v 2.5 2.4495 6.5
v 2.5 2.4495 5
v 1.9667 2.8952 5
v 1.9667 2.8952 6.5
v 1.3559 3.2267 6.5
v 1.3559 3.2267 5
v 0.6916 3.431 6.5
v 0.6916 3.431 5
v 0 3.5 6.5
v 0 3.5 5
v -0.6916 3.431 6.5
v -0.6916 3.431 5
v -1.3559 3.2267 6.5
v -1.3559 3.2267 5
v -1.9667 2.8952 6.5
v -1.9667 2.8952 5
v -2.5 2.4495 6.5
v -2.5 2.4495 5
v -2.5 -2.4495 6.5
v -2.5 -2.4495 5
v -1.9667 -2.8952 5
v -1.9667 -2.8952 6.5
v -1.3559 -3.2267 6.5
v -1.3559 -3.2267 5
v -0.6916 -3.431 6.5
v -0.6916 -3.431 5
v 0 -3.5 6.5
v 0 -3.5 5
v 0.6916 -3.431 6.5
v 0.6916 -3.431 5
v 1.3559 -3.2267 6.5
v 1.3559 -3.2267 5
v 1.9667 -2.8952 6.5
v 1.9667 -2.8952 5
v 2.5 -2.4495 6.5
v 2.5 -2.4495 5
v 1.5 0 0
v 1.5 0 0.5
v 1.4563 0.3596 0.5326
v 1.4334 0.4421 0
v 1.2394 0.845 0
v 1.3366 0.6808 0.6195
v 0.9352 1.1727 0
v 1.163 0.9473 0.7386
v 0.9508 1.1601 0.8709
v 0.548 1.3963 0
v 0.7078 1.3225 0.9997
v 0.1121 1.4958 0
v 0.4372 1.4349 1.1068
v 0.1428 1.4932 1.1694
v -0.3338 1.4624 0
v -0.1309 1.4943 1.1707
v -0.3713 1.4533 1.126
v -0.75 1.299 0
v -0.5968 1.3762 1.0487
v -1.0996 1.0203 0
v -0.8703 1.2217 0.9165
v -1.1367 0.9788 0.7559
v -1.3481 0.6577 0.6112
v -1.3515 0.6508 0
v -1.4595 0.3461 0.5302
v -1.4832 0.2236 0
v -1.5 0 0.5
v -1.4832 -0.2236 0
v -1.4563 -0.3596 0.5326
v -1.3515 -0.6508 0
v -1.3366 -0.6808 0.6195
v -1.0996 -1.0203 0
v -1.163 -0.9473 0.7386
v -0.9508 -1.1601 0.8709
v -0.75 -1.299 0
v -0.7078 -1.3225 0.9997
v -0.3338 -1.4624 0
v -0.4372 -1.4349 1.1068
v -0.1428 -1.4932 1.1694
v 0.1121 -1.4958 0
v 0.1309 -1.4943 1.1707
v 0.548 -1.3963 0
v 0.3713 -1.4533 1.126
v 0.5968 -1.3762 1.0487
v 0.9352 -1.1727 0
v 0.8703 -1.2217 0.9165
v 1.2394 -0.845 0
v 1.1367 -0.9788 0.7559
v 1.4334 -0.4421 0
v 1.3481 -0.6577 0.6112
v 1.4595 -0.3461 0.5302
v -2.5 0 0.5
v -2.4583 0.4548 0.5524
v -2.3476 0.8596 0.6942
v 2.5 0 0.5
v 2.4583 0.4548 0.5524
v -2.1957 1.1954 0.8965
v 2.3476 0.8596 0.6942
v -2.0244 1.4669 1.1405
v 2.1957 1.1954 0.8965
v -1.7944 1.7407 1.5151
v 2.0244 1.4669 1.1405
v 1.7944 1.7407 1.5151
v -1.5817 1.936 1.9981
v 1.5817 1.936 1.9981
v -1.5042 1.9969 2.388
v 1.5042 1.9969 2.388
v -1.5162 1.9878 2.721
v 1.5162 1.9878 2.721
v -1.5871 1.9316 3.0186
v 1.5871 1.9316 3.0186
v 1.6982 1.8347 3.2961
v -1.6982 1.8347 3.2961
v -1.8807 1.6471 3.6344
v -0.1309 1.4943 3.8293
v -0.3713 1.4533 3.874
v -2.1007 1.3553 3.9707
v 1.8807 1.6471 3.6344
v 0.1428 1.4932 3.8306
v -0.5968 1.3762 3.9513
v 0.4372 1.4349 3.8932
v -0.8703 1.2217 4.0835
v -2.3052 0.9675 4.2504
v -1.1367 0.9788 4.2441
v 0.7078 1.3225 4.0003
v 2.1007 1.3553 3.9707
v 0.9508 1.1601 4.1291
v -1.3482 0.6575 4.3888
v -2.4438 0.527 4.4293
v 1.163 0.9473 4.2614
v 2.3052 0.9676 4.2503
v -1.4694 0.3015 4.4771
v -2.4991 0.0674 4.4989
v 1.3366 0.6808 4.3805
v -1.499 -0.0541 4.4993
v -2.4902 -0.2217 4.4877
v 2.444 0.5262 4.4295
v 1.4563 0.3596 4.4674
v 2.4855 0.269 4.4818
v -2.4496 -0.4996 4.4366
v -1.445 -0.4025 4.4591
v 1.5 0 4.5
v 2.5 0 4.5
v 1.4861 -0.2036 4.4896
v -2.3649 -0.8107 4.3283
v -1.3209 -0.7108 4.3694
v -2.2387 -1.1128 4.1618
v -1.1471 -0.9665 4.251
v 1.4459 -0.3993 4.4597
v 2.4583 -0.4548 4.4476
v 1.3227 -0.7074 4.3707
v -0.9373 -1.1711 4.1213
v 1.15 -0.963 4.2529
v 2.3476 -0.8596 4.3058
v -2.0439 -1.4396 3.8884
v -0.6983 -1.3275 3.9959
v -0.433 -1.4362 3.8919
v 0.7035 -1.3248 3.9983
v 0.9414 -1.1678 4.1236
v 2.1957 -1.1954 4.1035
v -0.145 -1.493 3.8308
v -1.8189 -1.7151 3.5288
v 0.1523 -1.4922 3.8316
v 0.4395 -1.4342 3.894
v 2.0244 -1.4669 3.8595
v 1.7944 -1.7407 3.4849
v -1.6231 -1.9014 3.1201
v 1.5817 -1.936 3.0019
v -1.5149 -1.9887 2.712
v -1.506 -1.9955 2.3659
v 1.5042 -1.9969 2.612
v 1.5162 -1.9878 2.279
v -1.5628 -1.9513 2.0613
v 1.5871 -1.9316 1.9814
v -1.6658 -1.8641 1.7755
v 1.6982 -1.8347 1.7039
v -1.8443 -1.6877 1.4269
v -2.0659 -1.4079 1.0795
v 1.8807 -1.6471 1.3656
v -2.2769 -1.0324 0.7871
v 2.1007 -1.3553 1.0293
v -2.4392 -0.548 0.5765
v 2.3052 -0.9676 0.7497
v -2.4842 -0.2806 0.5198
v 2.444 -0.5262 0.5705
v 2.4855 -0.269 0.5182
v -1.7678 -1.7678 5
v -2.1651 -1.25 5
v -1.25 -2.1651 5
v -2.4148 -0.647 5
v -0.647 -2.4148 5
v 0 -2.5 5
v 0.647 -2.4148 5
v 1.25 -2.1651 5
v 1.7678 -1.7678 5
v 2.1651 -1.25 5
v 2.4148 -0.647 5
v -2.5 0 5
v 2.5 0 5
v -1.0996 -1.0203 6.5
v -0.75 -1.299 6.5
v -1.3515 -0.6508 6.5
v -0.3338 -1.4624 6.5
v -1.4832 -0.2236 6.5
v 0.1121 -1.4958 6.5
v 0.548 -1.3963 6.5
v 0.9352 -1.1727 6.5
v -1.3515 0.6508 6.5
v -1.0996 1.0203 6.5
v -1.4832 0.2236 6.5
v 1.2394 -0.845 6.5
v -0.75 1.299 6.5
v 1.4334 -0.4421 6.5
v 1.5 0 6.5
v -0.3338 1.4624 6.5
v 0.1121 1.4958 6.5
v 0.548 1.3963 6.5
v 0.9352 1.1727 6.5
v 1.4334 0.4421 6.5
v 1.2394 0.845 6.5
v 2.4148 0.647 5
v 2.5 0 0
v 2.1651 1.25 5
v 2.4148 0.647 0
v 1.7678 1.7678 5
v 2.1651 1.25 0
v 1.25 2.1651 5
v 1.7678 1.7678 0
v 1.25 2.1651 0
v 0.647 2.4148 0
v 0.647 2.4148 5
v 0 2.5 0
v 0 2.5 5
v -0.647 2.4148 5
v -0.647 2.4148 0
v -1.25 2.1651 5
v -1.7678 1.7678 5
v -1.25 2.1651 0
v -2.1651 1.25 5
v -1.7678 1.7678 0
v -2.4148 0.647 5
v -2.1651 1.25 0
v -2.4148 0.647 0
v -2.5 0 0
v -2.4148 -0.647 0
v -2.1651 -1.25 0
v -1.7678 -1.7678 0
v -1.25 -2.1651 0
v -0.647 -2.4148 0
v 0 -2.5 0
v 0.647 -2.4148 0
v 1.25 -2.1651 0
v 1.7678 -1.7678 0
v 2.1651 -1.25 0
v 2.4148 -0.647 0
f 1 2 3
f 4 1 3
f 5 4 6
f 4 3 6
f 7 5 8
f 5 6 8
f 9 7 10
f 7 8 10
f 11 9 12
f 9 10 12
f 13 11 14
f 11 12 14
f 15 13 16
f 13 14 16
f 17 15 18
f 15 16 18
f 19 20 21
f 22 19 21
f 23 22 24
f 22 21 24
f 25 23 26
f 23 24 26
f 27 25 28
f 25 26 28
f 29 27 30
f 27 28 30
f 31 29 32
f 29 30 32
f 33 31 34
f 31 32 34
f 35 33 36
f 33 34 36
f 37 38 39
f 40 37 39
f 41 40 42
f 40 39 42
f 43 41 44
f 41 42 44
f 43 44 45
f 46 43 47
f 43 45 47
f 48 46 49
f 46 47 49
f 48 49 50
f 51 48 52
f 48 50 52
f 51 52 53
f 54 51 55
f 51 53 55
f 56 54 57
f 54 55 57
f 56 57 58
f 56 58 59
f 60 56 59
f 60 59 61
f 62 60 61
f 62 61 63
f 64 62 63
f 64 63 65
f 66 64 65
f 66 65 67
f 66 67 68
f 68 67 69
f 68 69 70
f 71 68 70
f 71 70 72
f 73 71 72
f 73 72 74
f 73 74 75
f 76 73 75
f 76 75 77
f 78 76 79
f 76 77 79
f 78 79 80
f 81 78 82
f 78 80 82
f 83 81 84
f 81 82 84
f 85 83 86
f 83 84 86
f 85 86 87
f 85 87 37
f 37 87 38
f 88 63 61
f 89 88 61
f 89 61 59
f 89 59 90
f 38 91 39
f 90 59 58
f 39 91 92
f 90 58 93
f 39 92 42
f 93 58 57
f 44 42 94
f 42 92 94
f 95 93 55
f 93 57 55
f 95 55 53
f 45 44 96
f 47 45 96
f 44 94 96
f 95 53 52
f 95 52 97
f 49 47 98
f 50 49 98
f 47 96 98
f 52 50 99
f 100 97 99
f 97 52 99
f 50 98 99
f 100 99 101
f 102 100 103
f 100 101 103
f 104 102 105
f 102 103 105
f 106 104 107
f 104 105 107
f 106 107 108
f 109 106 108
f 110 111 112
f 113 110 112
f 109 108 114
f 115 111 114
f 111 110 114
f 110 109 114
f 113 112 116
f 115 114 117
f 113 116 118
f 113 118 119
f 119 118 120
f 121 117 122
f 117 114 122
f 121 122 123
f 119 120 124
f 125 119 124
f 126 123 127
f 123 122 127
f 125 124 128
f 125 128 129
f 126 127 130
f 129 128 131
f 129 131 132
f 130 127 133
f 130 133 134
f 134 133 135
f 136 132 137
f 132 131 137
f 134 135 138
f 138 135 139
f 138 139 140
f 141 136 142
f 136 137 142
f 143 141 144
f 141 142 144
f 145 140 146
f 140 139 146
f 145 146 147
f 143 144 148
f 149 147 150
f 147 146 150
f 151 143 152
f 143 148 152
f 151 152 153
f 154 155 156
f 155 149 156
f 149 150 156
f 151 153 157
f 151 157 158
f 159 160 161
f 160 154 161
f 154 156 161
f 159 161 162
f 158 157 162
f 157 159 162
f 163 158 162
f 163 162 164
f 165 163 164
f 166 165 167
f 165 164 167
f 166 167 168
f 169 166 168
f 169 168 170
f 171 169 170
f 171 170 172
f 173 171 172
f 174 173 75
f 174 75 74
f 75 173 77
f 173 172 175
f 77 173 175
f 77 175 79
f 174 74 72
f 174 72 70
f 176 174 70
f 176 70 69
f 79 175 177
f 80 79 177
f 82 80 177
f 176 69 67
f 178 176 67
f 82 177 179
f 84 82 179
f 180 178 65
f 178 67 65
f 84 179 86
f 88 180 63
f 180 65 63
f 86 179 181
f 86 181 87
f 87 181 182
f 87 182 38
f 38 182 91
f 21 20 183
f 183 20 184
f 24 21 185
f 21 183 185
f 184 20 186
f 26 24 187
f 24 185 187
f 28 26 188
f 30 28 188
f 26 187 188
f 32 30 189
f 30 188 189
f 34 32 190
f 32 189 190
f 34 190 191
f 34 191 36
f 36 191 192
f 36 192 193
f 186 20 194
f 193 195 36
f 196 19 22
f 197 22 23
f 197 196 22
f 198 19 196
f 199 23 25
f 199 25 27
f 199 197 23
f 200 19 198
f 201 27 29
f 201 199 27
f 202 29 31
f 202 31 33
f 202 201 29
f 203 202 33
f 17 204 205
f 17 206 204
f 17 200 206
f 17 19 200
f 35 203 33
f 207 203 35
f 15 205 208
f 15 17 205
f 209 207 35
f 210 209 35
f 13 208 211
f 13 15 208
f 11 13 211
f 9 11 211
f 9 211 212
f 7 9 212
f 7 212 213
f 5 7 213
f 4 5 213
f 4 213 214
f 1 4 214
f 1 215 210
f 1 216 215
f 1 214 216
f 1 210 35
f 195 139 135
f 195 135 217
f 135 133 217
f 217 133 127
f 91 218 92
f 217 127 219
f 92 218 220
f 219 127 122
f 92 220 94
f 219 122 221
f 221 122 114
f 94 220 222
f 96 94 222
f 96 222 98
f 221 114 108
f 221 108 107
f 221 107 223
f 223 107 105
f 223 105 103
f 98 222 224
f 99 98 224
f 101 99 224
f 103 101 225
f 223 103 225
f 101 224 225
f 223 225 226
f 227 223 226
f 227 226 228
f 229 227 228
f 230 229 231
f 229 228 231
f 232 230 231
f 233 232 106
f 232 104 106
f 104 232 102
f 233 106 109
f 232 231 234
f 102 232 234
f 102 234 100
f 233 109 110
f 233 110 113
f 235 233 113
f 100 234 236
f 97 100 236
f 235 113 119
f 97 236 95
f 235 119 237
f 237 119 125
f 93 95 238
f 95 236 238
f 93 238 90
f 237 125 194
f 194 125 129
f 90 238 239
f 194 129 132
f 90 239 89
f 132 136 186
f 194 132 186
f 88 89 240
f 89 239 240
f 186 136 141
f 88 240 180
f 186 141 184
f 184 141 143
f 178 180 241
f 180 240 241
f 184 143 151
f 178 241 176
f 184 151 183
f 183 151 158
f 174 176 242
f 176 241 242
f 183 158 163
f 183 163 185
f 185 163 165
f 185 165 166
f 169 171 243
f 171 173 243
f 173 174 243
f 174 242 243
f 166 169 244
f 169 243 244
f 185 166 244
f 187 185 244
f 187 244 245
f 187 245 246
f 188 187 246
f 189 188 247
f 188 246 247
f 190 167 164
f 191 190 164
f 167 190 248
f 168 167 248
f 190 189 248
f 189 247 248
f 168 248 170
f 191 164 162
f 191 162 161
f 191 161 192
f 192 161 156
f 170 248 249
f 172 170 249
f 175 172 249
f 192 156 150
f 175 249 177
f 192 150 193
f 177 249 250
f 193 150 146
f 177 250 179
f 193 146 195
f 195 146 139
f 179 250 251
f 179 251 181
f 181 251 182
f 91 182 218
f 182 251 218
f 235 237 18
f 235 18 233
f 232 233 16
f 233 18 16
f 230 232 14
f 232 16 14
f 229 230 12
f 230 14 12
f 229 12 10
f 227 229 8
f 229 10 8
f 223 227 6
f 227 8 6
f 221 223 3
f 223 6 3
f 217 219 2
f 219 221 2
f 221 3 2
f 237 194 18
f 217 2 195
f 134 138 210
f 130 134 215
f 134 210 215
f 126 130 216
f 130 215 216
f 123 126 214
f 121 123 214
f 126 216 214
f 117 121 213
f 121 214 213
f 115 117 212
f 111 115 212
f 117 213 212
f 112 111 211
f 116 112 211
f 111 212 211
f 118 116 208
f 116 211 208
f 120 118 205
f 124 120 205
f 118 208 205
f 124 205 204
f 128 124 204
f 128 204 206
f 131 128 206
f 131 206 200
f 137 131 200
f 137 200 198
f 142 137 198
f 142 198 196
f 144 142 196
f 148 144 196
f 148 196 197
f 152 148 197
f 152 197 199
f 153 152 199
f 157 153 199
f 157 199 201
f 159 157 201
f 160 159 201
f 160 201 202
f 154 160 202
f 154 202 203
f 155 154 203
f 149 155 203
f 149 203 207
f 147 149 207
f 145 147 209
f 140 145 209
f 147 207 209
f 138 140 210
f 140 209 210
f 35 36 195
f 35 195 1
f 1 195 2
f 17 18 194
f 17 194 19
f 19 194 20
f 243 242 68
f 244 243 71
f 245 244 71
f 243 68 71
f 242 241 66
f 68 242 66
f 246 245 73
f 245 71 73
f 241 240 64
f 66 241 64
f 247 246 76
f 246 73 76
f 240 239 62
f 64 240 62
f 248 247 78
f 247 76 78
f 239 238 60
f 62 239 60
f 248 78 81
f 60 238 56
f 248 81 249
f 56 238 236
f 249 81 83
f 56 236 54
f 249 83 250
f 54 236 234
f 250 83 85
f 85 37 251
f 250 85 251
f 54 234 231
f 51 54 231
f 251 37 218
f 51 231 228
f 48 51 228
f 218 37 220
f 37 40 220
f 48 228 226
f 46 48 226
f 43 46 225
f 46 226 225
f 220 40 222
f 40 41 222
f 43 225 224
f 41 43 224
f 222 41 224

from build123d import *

# Parameters (mm, degrees)
SKETCH_1_R          = 2.5
EXTRUDE_1_DEPTH     = 5
EXTRUDE_2_DEPTH     = 1.5
SKETCH_3_R          = 1.5
CUT_EXTRUDE_1_DEPTH = 7.5
SKETCH_4_R          = 2
CUT_EXTRUDE_2_DEPTH = 5


with BuildPart() as part:
    # 草图1 → 凸台-拉伸1 (new body)
    with BuildSketch(Plane.XY):
        Circle(SKETCH_1_R)
    extrude(amount=EXTRUDE_1_DEPTH)

    # 草图2 → 凸台-拉伸2 (add)
    with BuildSketch(Plane.XY.offset(5)):
        with BuildLine():
            Line((-2.5, 2.449489743), (-2.5, -2.449489743))
            ThreePointArc((-2.5, -2.449489743), (0, -3.5), (2.5, -2.449489743))
            Line((2.5, -2.449489743), (2.5, 2.449489743))
            ThreePointArc((2.5, 2.449489743), (0, 3.5), (-2.5, 2.449489743))
        make_face()
    extrude(amount=EXTRUDE_2_DEPTH)

    # 草图3 → 切除-拉伸1 (cut, through all)
    with BuildSketch(Plane.XY.offset(6.5)):
        Circle(SKETCH_3_R)
    extrude(amount=-CUT_EXTRUDE_1_DEPTH, mode=Mode.SUBTRACT)

    # 草图4 → 切除-拉伸2 (cut, symmetric)
    with BuildSketch(Plane(origin=(0, 0, 0), x_dir=(0, 0, -1), z_dir=(1, 0, 0))):
        with Locations((-2.5, 0)):
            Circle(SKETCH_4_R)
    extrude(amount=CUT_EXTRUDE_2_DEPTH, both=True, mode=Mode.SUBTRACT)


solid = part.part
